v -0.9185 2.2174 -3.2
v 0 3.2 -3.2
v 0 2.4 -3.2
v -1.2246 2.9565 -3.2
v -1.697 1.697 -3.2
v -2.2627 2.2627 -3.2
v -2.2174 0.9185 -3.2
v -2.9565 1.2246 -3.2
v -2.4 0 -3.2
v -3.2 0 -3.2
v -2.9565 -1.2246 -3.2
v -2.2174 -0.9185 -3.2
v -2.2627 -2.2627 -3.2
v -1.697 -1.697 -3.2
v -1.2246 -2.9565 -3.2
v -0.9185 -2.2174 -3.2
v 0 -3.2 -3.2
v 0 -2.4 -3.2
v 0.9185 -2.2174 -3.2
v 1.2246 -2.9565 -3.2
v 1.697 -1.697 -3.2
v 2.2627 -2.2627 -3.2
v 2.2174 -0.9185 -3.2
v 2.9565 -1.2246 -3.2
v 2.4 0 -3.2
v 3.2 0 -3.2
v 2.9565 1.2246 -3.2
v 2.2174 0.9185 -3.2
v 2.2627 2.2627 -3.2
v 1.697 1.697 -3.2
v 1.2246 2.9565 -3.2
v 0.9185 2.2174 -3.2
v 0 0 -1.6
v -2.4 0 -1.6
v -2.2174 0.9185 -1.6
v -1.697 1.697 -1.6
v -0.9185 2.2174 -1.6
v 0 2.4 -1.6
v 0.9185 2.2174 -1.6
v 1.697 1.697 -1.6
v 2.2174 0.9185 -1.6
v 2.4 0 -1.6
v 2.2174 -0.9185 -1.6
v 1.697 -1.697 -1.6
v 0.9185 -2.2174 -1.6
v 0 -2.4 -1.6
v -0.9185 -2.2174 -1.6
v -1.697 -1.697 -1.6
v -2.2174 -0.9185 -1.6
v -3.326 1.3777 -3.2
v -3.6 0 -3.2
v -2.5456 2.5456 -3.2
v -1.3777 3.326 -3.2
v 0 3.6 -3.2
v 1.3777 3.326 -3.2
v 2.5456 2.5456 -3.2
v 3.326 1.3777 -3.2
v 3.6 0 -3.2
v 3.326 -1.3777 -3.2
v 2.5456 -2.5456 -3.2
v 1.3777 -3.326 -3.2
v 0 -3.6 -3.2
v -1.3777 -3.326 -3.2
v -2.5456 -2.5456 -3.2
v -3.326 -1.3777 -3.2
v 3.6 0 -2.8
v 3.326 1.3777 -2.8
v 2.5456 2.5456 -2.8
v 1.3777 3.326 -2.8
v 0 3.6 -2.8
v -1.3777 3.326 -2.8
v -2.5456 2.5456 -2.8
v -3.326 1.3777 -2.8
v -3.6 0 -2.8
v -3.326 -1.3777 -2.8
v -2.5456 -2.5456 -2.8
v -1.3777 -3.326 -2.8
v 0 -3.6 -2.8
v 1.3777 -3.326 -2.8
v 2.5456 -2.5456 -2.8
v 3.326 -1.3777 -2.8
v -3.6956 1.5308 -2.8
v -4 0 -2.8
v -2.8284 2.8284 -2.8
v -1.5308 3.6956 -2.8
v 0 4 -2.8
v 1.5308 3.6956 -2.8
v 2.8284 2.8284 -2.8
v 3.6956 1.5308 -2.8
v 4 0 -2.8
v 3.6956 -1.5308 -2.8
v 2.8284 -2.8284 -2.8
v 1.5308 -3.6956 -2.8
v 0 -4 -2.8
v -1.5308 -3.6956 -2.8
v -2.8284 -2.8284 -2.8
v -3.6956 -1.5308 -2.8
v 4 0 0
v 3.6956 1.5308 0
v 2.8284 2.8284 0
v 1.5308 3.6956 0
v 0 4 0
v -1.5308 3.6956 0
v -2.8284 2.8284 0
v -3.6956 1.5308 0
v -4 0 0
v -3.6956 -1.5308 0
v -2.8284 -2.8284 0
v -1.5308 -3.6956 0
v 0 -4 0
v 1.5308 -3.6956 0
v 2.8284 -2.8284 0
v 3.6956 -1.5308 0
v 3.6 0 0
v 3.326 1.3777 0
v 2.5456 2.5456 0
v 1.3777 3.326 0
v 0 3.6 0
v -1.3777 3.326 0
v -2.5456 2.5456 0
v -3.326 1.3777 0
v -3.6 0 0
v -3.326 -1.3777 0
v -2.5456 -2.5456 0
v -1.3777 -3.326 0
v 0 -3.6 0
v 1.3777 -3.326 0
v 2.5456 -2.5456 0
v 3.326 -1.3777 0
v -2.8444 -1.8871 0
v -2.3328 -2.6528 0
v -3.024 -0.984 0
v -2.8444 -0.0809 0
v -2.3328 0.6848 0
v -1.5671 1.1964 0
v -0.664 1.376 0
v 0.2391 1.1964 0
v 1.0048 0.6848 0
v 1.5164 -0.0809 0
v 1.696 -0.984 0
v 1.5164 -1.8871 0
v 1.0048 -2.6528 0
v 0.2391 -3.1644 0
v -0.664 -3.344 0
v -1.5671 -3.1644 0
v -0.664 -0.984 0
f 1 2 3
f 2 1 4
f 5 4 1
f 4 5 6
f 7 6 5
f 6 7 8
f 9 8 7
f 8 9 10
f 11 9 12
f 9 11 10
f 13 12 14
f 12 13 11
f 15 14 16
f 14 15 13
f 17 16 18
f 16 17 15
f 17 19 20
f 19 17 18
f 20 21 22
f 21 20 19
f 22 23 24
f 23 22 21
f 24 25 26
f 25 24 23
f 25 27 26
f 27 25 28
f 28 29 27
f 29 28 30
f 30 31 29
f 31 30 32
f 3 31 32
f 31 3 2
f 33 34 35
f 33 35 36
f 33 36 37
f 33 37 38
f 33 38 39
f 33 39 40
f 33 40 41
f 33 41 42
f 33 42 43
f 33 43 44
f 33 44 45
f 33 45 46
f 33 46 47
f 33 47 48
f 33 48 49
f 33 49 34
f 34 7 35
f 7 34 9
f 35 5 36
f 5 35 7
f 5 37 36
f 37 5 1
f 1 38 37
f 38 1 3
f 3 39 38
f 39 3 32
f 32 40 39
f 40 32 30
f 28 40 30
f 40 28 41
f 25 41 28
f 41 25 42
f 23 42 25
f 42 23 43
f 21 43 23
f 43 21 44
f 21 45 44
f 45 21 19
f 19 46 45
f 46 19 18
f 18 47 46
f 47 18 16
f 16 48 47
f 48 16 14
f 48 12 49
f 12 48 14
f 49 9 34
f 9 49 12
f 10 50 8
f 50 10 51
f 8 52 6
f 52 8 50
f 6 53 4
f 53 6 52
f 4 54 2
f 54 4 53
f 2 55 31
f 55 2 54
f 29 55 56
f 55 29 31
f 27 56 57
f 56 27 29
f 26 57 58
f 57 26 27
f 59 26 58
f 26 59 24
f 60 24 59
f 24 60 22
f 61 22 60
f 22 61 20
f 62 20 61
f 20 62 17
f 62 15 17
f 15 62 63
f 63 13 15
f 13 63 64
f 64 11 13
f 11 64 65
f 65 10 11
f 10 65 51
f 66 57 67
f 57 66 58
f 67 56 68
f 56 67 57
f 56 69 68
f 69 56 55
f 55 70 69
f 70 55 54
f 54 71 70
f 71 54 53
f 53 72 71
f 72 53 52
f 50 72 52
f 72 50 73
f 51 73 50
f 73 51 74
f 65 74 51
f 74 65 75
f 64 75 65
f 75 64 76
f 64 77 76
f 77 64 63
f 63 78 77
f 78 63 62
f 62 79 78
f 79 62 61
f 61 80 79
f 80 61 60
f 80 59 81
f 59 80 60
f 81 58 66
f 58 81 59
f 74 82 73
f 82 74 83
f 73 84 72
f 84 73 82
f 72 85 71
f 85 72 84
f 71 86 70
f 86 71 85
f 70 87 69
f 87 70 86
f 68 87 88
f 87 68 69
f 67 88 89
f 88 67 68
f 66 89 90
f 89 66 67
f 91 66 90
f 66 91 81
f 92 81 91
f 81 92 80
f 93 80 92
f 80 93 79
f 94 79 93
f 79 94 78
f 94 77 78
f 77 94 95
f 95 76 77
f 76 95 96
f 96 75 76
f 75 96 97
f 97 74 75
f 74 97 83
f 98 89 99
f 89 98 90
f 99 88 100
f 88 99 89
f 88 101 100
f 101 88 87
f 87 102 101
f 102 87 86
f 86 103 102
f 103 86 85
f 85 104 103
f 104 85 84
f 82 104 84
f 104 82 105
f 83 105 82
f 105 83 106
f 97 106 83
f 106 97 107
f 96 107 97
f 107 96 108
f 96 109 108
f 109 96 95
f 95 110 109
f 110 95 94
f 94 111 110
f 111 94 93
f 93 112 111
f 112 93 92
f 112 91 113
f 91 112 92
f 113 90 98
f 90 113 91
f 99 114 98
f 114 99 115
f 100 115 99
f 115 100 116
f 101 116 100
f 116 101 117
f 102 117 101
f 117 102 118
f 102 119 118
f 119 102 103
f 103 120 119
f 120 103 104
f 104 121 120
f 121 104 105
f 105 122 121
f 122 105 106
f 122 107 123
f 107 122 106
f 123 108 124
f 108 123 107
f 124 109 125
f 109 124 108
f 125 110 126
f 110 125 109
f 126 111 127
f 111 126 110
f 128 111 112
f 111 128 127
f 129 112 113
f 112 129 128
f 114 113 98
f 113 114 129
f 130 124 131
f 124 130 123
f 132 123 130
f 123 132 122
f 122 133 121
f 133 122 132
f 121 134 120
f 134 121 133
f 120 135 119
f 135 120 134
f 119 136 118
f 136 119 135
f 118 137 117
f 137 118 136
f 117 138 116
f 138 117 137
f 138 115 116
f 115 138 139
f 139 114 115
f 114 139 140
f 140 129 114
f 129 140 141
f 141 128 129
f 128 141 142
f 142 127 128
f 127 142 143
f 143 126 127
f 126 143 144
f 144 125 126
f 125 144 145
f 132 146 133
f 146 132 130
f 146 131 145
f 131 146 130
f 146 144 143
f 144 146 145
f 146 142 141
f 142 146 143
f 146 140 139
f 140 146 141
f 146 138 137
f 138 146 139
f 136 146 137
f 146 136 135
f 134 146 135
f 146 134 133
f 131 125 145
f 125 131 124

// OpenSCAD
// file: ../p/4-4disc.scad
use <../lib.scad>
function ldraw_lib__4_4disc() = [
// 0 Disc 1.0
// 0 Name: 4-4disc.dat
// 0 Author: James Jessiman
// 0 !LDRAW_ORG Primitive UPDATE 2002-02
// 0 !LICENSE Licensed under CC BY 4.0 : see CAreadme.txt
// 
// 0 BFC CERTIFY CCW
  [0,"BFC","CERTIFY"],
  [0,"BFC","CCW"],
// 
// 0 !HISTORY 1998-12-15 [PTadmin] Official Update 1998-10
// 0 !HISTORY 2002-03-23 [sbliss] Added BFC statement
// 0 !HISTORY 2002-04-25 [PTadmin] Official Update 2002-02
// 0 !HISTORY 2007-06-24 [PTadmin] Header formatted for Contributor Agreement
// 0 !HISTORY 2008-07-01 [PTadmin] Official Update 2008-01
// 
// 
// 3 16 0 0 0 1 0 0 0.9239 0 0.3827
  [3,16,0,0,0,1,0,0,0.9239,0,0.3827],
// 3 16 0 0 0 0.9239 0 0.3827 0.7071 0 0.7071
  [3,16,0,0,0,0.9239,0,0.3827,0.7071,0,0.7071],
// 3 16 0 0 0 0.7071 0 0.7071 0.3827 0 0.9239
  [3,16,0,0,0,0.7071,0,0.7071,0.3827,0,0.9239],
// 3 16 0 0 0 0.3827 0 0.9239 0 0 1
  [3,16,0,0,0,0.3827,0,0.9239,0,0,1],
// 3 16 0 0 0 0 0 1 -0.3827 0 0.9239
  [3,16,0,0,0,0,0,1,-0.3827,0,0.9239],
// 3 16 0 0 0 -0.3827 0 0.9239 -0.7071 0 0.7071
  [3,16,0,0,0,-0.3827,0,0.9239,-0.7071,0,0.7071],
// 3 16 0 0 0 -0.7071 0 0.7071 -0.9239 0 0.3827
  [3,16,0,0,0,-0.7071,0,0.7071,-0.9239,0,0.3827],
// 3 16 0 0 0 -0.9239 0 0.3827 -1 0 -0
  [3,16,0,0,0,-0.9239,0,0.3827,-1,0,-0],
// 3 16 0 0 0 -1 0 -0 -0.9239 0 -0.3827
  [3,16,0,0,0,-1,0,-0,-0.9239,0,-0.3827],
// 3 16 0 0 0 -0.9239 0 -0.3827 -0.7071 0 -0.7071
  [3,16,0,0,0,-0.9239,0,-0.3827,-0.7071,0,-0.7071],
// 3 16 0 0 0 -0.7071 0 -0.7071 -0.3827 0 -0.9239
  [3,16,0,0,0,-0.7071,0,-0.7071,-0.3827,0,-0.9239],
// 3 16 0 0 0 -0.3827 0 -0.9239 0 0 -1
  [3,16,0,0,0,-0.3827,0,-0.9239,0,0,-1],
// 3 16 0 0 0 0 0 -1 0.3827 0 -0.9239
  [3,16,0,0,0,0,0,-1,0.3827,0,-0.9239],
// 3 16 0 0 0 0.3827 0 -0.9239 0.7071 0 -0.7071
  [3,16,0,0,0,0.3827,0,-0.9239,0.7071,0,-0.7071],
// 3 16 0 0 0 0.7071 0 -0.7071 0.9239 0 -0.3827
  [3,16,0,0,0,0.7071,0,-0.7071,0.9239,0,-0.3827],
// 3 16 0 0 0 0.9239 0 -0.3827 1 0 0
  [3,16,0,0,0,0.9239,0,-0.3827,1,0,0],
// 0
];
module ldraw_lib__4_4disc(step=0, col=false, unit=2/5, alt=false, line=0.2, solid=!$preview)
    makepoly(ldraw_lib__4_4disc(), step=step, col=col, unit=unit, alt=alt, line=line, solid=solid);
ldraw_lib__4_4disc(line=0.2);
// file: ../p/4-4ring3.scad
use <../lib.scad>
function ldraw_lib__4_4ring3() = [
// 0 Ring  3 x 1.0
// 0 Name: 4-4ring3.dat
// 0 Author: James Jessiman
// 0 !LDRAW_ORG Primitive UPDATE 2009-01
// 0 !LICENSE Licensed under CC BY 2.0 and CC BY 4.0 : see CAreadme.txt
// 
// 0 BFC CERTIFY CCW
  [0,"BFC","CERTIFY"],
  [0,"BFC","CCW"],
// 
// 0 !HISTORY 1998-12-15 [PTadmin] Official Update 1998-10
// 0 !HISTORY 2002-04-05 [hafhead] Added BFC statement
// 0 !HISTORY 2002-04-25 [PTadmin] Official Update 2002-02
// 0 !HISTORY 2007-06-24 [PTadmin] Header formatted for Contributor Agreement
// 0 !HISTORY 2008-07-01 [PTadmin] Official Update 2008-01
// 0 !HISTORY 2008-08-26 [cwdee] Switch polygon winding and rename
// 0 !HISTORY 2009-05-02 [PTadmin] Official Update 2009-01
// 
// 
// 4 16 -1.5308 0 3.6956 -1.1481 0 2.7717 0 0 3 0 0 4
  [4,16,-1.5308,0,3.6956,-1.1481,0,2.7717,0,0,3,0,0,4],
// 4 16 -2.8284 0 2.8284 -2.1213 0 2.1213 -1.1481 0 2.7717 -1.5308 0 3.6956
  [4,16,-2.8284,0,2.8284,-2.1213,0,2.1213,-1.1481,0,2.7717,-1.5308,0,3.6956],
// 4 16 -3.6956 0 1.5308 -2.7717 0 1.1481 -2.1213 0 2.1213 -2.8284 0 2.8284
  [4,16,-3.6956,0,1.5308,-2.7717,0,1.1481,-2.1213,0,2.1213,-2.8284,0,2.8284],
// 4 16 -4 0 0 -3 0 0 -2.7717 0 1.1481 -3.6956 0 1.5308
  [4,16,-4,0,0,-3,0,0,-2.7717,0,1.1481,-3.6956,0,1.5308],
// 4 16 -3.6956 0 -1.5308 -2.7717 0 -1.1481 -3 0 0 -4 0 0
  [4,16,-3.6956,0,-1.5308,-2.7717,0,-1.1481,-3,0,0,-4,0,0],
// 4 16 -2.8284 0 -2.8284 -2.1213 0 -2.1213 -2.7717 0 -1.1481 -3.6956 0 -1.5308
  [4,16,-2.8284,0,-2.8284,-2.1213,0,-2.1213,-2.7717,0,-1.1481,-3.6956,0,-1.5308],
// 4 16 -1.5308 0 -3.6956 -1.1481 0 -2.7717 -2.1213 0 -2.1213 -2.8284 0 -2.8284
  [4,16,-1.5308,0,-3.6956,-1.1481,0,-2.7717,-2.1213,0,-2.1213,-2.8284,0,-2.8284],
// 4 16 0 0 -4 0 0 -3 -1.1481 0 -2.7717 -1.5308 0 -3.6956
  [4,16,0,0,-4,0,0,-3,-1.1481,0,-2.7717,-1.5308,0,-3.6956],
// 4 16 1.5308 0 -3.6956 1.1481 0 -2.7717 0 0 -3 0 0 -4
  [4,16,1.5308,0,-3.6956,1.1481,0,-2.7717,0,0,-3,0,0,-4],
// 4 16 2.8284 0 -2.8284 2.1213 0 -2.1213 1.1481 0 -2.7717 1.5308 0 -3.6956
  [4,16,2.8284,0,-2.8284,2.1213,0,-2.1213,1.1481,0,-2.7717,1.5308,0,-3.6956],
// 4 16 3.6956 0 -1.5308 2.7717 0 -1.1481 2.1213 0 -2.1213 2.8284 0 -2.8284
  [4,16,3.6956,0,-1.5308,2.7717,0,-1.1481,2.1213,0,-2.1213,2.8284,0,-2.8284],
// 4 16 4 0 0 3 0 0 2.7717 0 -1.1481 3.6956 0 -1.5308
  [4,16,4,0,0,3,0,0,2.7717,0,-1.1481,3.6956,0,-1.5308],
// 4 16 3.6956 0 1.5308 2.7717 0 1.1481 3 0 0 4 0 0
  [4,16,3.6956,0,1.5308,2.7717,0,1.1481,3,0,0,4,0,0],
// 4 16 2.8284 0 2.8284 2.1213 0 2.1213 2.7717 0 1.1481 3.6956 0 1.5308
  [4,16,2.8284,0,2.8284,2.1213,0,2.1213,2.7717,0,1.1481,3.6956,0,1.5308],
// 4 16 1.5308 0 3.6956 1.1481 0 2.7717 2.1213 0 2.1213 2.8284 0 2.8284
  [4,16,1.5308,0,3.6956,1.1481,0,2.7717,2.1213,0,2.1213,2.8284,0,2.8284],
// 4 16 0 0 4 0 0 3 1.1481 0 2.7717 1.5308 0 3.6956
  [4,16,0,0,4,0,0,3,1.1481,0,2.7717,1.5308,0,3.6956],
// 0
];
module ldraw_lib__4_4ring3(step=0, col=false, unit=2/5, alt=false, line=0.2, solid=!$preview)
    makepoly(ldraw_lib__4_4ring3(), step=step, col=col, unit=unit, alt=alt, line=line, solid=solid);
ldraw_lib__4_4ring3(line=0.2);
// file: ../p/4-4cylc.scad
use <../lib.scad>
use <4-4cyli.scad>
use <4-4disc.scad>
use <4-4edge.scad>
function ldraw_lib__4_4cylc() = [
// 0 Cylinder Closed 1.0
// 0 Name: 4-4cylc.dat
// 0 Author: Alex Taylor [anathema]
// 0 !LDRAW_ORG Primitive UPDATE 2009-02
// 0 !LICENSE Licensed under CC BY 2.0 and CC BY 4.0 : see CAreadme.txt
// 
// 0 BFC CERTIFY CCW
  [0,"BFC","CERTIFY"],
  [0,"BFC","CCW"],
// 
// 0 !HISTORY 2008-12-29 [cwdee] Removed one disc
// 0 !HISTORY 2009-09-03 [PTadmin] Official Update 2009-02
// 
// 
// 1 16 0 0 0 1 0 0 0 1 0 0 0 1 4-4edge.dat
  [1,16,0,0,0,1,0,0,0,1,0,0,0,1, ldraw_lib__4_4edge()],
// 1 16 0 1 0 1 0 0 0 1 0 0 0 1 4-4edge.dat
  [1,16,0,1,0,1,0,0,0,1,0,0,0,1, ldraw_lib__4_4edge()],
// 1 16 0 0 0 1 0 0 0 1 0 0 0 1 4-4disc.dat
  [1,16,0,0,0,1,0,0,0,1,0,0,0,1, ldraw_lib__4_4disc()],
// 1 16 0 0 0 1 0 0 0 1 0 0 0 1 4-4cyli.dat
  [1,16,0,0,0,1,0,0,0,1,0,0,0,1, ldraw_lib__4_4cyli()],
// 0
];
module ldraw_lib__4_4cylc(step=0, col=false, unit=2/5, alt=false, line=0.2, solid=!$preview)
    makepoly(ldraw_lib__4_4cylc(), step=step, col=col, unit=unit, alt=alt, line=line, solid=solid);
ldraw_lib__4_4cylc(line=0.2);
// file: ../p/4-4edge.scad
use <../lib.scad>
function ldraw_lib__4_4edge() = [
// 0 Circle 1.0
// 0 Name: 4-4edge.dat
// 0 Author: James Jessiman
// 0 !LDRAW_ORG Primitive UPDATE 2017-01
// 0 !LICENSE Licensed under CC BY 4.0 : see CAreadme.txt
// 
// 0 BFC CERTIFY CCW
  [0,"BFC","CERTIFY"],
  [0,"BFC","CCW"],
// 
// 0 !HISTORY 1998-12-15 [PTadmin] Official Update 1998-10
// 0 !HISTORY 2005-12-28 [PTadmin] Official Update 2005-01
// 0 !HISTORY 2007-06-24 [PTadmin] Header formatted for Contributor Agreement
// 0 !HISTORY 2008-07-01 [PTadmin] Official Update 2008-01
// 0 !HISTORY 2017-01-15 [Steffen] BFCed
// 0 !HISTORY 2017-12-30 [PTadmin] Official Update 2017-01
// 
// 
// 2 24 1 0 0 0.9239 0 0.3827
  [2,24,1,0,0,0.9239,0,0.3827],
// 2 24 0.9239 0 0.3827 0.7071 0 0.7071
  [2,24,0.9239,0,0.3827,0.7071,0,0.7071],
// 2 24 0.7071 0 0.7071 0.3827 0 0.9239
  [2,24,0.7071,0,0.7071,0.3827,0,0.9239],
// 2 24 0.3827 0 0.9239 0 0 1
  [2,24,0.3827,0,0.9239,0,0,1],
// 2 24 0 0 1 -0.3827 0 0.9239
  [2,24,0,0,1,-0.3827,0,0.9239],
// 2 24 -0.3827 0 0.9239 -0.7071 0 0.7071
  [2,24,-0.3827,0,0.9239,-0.7071,0,0.7071],
// 2 24 -0.7071 0 0.7071 -0.9239 0 0.3827
  [2,24,-0.7071,0,0.7071,-0.9239,0,0.3827],
// 2 24 -0.9239 0 0.3827 -1 0 -0
  [2,24,-0.9239,0,0.3827,-1,0,-0],
// 2 24 -1 0 -0 -0.9239 0 -0.3827
  [2,24,-1,0,-0,-0.9239,0,-0.3827],
// 2 24 -0.9239 0 -0.3827 -0.7071 0 -0.7071
  [2,24,-0.9239,0,-0.3827,-0.7071,0,-0.7071],
// 2 24 -0.7071 0 -0.7071 -0.3827 0 -0.9239
  [2,24,-0.7071,0,-0.7071,-0.3827,0,-0.9239],
// 2 24 -0.3827 0 -0.9239 0 0 -1
  [2,24,-0.3827,0,-0.9239,0,0,-1],
// 2 24 0 0 -1 0.3827 0 -0.9239
  [2,24,0,0,-1,0.3827,0,-0.9239],
// 2 24 0.3827 0 -0.9239 0.7071 0 -0.7071
  [2,24,0.3827,0,-0.9239,0.7071,0,-0.7071],
// 2 24 0.7071 0 -0.7071 0.9239 0 -0.3827
  [2,24,0.7071,0,-0.7071,0.9239,0,-0.3827],
// 2 24 0.9239 0 -0.3827 1 0 0
  [2,24,0.9239,0,-0.3827,1,0,0],
];
module ldraw_lib__4_4edge(step=0, col=false, unit=2/5, alt=false, line=0.2, solid=!$preview)
    makepoly(ldraw_lib__4_4edge(), step=step, col=col, unit=unit, alt=alt, line=line, solid=solid);
ldraw_lib__4_4edge(line=0.2);
// file: ../p/4-4cyli.scad
use <../lib.scad>
function ldraw_lib__4_4cyli() = [
// 0 Cylinder 1.0
// 0 Name: 4-4cyli.dat
// 0 Author: James Jessiman
// 0 !LDRAW_ORG Primitive UPDATE 2005-01
// 0 !LICENSE Licensed under CC BY 2.0 and CC BY 4.0 : see CAreadme.txt
// 
// 0 BFC CERTIFY CCW
  [0,"BFC","CERTIFY"],
  [0,"BFC","CCW"],
// 
// 0 !HISTORY 1998-12-15 [PTadmin] Official Update 1998-10
// 0 !HISTORY 2002-03-23 [sbliss] Added BFC statement; merged headers from files in distributions LDraw 0.27 and Complete.
// 0 !HISTORY 2002-04-25 [PTadmin] Official Update 2002-02
// 0 !HISTORY 2004-12-14 [guyvivan] BFC CCW
// 0 !HISTORY 2005-12-28 [PTadmin] Official Update 2005-01
// 0 !HISTORY 2007-06-24 [PTadmin] Header formatted for Contributor Agreement
// 0 !HISTORY 2008-07-01 [PTadmin] Official Update 2008-01
// 
// 
// 4 16 1 1 0 0.9239 1 0.3827 0.9239 0 0.3827 1 0 0
  [4,16,1,1,0,0.9239,1,0.3827,0.9239,0,0.3827,1,0,0],
// 5 24 1 0 0 1 1 0 0.9239 0 0.3827 0.9239 0 -0.3827
  [5,24,1,0,0,1,1,0,0.9239,0,0.3827,0.9239,0,-0.3827],
// 4 16 0.9239 1 0.3827 0.7071 1 0.7071 0.7071 0 0.7071 0.9239 0 0.3827
  [4,16,0.9239,1,0.3827,0.7071,1,0.7071,0.7071,0,0.7071,0.9239,0,0.3827],
// 5 24 0.9239 0 0.3827 0.9239 1 0.3827 0.7071 0 0.7071 1 0 0
  [5,24,0.9239,0,0.3827,0.9239,1,0.3827,0.7071,0,0.7071,1,0,0],
// 4 16 0.7071 1 0.7071 0.3827 1 0.9239 0.3827 0 0.9239 0.7071 0 0.7071
  [4,16,0.7071,1,0.7071,0.3827,1,0.9239,0.3827,0,0.9239,0.7071,0,0.7071],
// 5 24 0.7071 0 0.7071 0.7071 1 0.7071 0.3827 0 0.9239 0.9239 0 0.3827
  [5,24,0.7071,0,0.7071,0.7071,1,0.7071,0.3827,0,0.9239,0.9239,0,0.3827],
// 4 16 0.3827 1 0.9239 0 1 1 0 0 1 0.3827 0 0.9239
  [4,16,0.3827,1,0.9239,0,1,1,0,0,1,0.3827,0,0.9239],
// 5 24 0.3827 0 0.9239 0.3827 1 0.9239 0 0 1 0.7071 0 0.7071
  [5,24,0.3827,0,0.9239,0.3827,1,0.9239,0,0,1,0.7071,0,0.7071],
// 4 16 0 1 1 -0.3827 1 0.9239 -0.3827 0 0.9239 0 0 1
  [4,16,0,1,1,-0.3827,1,0.9239,-0.3827,0,0.9239,0,0,1],
// 5 24 0 0 1 0 1 1 -0.3827 0 0.9239 0.3827 0 0.9239
  [5,24,0,0,1,0,1,1,-0.3827,0,0.9239,0.3827,0,0.9239],
// 4 16 -0.3827 1 0.9239 -0.7071 1 0.7071 -0.7071 0 0.7071 -0.3827 0 0.9239
  [4,16,-0.3827,1,0.9239,-0.7071,1,0.7071,-0.7071,0,0.7071,-0.3827,0,0.9239],
// 5 24 -0.3827 0 0.9239 -0.3827 1 0.9239 -0.7071 0 0.7071 0 0 1
  [5,24,-0.3827,0,0.9239,-0.3827,1,0.9239,-0.7071,0,0.7071,0,0,1],
// 4 16 -0.7071 1 0.7071 -0.9239 1 0.3827 -0.9239 0 0.3827 -0.7071 0 0.7071
  [4,16,-0.7071,1,0.7071,-0.9239,1,0.3827,-0.9239,0,0.3827,-0.7071,0,0.7071],
// 5 24 -0.7071 0 0.7071 -0.7071 1 0.7071 -0.9239 0 0.3827 -0.3827 0 0.9239
  [5,24,-0.7071,0,0.7071,-0.7071,1,0.7071,-0.9239,0,0.3827,-0.3827,0,0.9239],
// 4 16 -0.9239 1 0.3827 -1 1 0 -1 0 0 -0.9239 0 0.3827
  [4,16,-0.9239,1,0.3827,-1,1,0,-1,0,0,-0.9239,0,0.3827],
// 5 24 -0.9239 0 0.3827 -0.9239 1 0.3827 -1 0 0 -0.7071 0 0.7071
  [5,24,-0.9239,0,0.3827,-0.9239,1,0.3827,-1,0,0,-0.7071,0,0.7071],
// 4 16 -1 1 0 -0.9239 1 -0.3827 -0.9239 0 -0.3827 -1 0 0
  [4,16,-1,1,0,-0.9239,1,-0.3827,-0.9239,0,-0.3827,-1,0,0],
// 5 24 -1 0 0 -1 1 0 -0.9239 0 -0.3827 -0.9239 0 0.3827
  [5,24,-1,0,0,-1,1,0,-0.9239,0,-0.3827,-0.9239,0,0.3827],
// 4 16 -0.9239 1 -0.3827 -0.7071 1 -0.7071 -0.7071 0 -0.7071 -0.9239 0 -0.3827
  [4,16,-0.9239,1,-0.3827,-0.7071,1,-0.7071,-0.7071,0,-0.7071,-0.9239,0,-0.3827],
// 5 24 -0.9239 0 -0.3827 -0.9239 1 -0.3827 -0.7071 0 -0.7071 -1 0 0
  [5,24,-0.9239,0,-0.3827,-0.9239,1,-0.3827,-0.7071,0,-0.7071,-1,0,0],
// 4 16 -0.7071 1 -0.7071 -0.3827 1 -0.9239 -0.3827 0 -0.9239 -0.7071 0 -0.7071
  [4,16,-0.7071,1,-0.7071,-0.3827,1,-0.9239,-0.3827,0,-0.9239,-0.7071,0,-0.7071],
// 5 24 -0.7071 0 -0.7071 -0.7071 1 -0.7071 -0.3827 0 -0.9239 -0.9239 0 -0.3827
  [5,24,-0.7071,0,-0.7071,-0.7071,1,-0.7071,-0.3827,0,-0.9239,-0.9239,0,-0.3827],
// 4 16 -0.3827 1 -0.9239 0 1 -1 0 0 -1 -0.3827 0 -0.9239
  [4,16,-0.3827,1,-0.9239,0,1,-1,0,0,-1,-0.3827,0,-0.9239],
// 5 24 -0.3827 0 -0.9239 -0.3827 1 -0.9239 0 0 -1 -0.7071 0 -0.7071
  [5,24,-0.3827,0,-0.9239,-0.3827,1,-0.9239,0,0,-1,-0.7071,0,-0.7071],
// 4 16 0 1 -1 0.3827 1 -0.9239 0.3827 0 -0.9239 0 0 -1
  [4,16,0,1,-1,0.3827,1,-0.9239,0.3827,0,-0.9239,0,0,-1],
// 5 24 0 0 -1 0 1 -1 0.3827 0 -0.9239 -0.3827 0 -0.9239
  [5,24,0,0,-1,0,1,-1,0.3827,0,-0.9239,-0.3827,0,-0.9239],
// 4 16 0.3827 1 -0.9239 0.7071 1 -0.7071 0.7071 0 -0.7071 0.3827 0 -0.9239
  [4,16,0.3827,1,-0.9239,0.7071,1,-0.7071,0.7071,0,-0.7071,0.3827,0,-0.9239],
// 5 24 0.3827 0 -0.9239 0.3827 1 -0.9239 0.7071 0 -0.7071 0 0 -1
  [5,24,0.3827,0,-0.9239,0.3827,1,-0.9239,0.7071,0,-0.7071,0,0,-1],
// 4 16 0.7071 1 -0.7071 0.9239 1 -0.3827 0.9239 0 -0.3827 0.7071 0 -0.7071
  [4,16,0.7071,1,-0.7071,0.9239,1,-0.3827,0.9239,0,-0.3827,0.7071,0,-0.7071],
// 5 24 0.7071 0 -0.7071 0.7071 1 -0.7071 0.9239 0 -0.3827 0.3827 0 -0.9239
  [5,24,0.7071,0,-0.7071,0.7071,1,-0.7071,0.9239,0,-0.3827,0.3827,0,-0.9239],
// 4 16 0.9239 1 -0.3827 1 1 0 1 0 0 0.9239 0 -0.3827
  [4,16,0.9239,1,-0.3827,1,1,0,1,0,0,0.9239,0,-0.3827],
// 5 24 0.9239 0 -0.3827 0.9239 1 -0.3827 1 0 0 0.7071 0 -0.7071
  [5,24,0.9239,0,-0.3827,0.9239,1,-0.3827,1,0,0,0.7071,0,-0.7071],
// 0
];
module ldraw_lib__4_4cyli(step=0, col=false, unit=2/5, alt=false, line=0.2, solid=!$preview)
    makepoly(ldraw_lib__4_4cyli(), step=step, col=col, unit=unit, alt=alt, line=line, solid=solid);
ldraw_lib__4_4cyli(line=0.2);
// file: ../p/stud4o.scad
use <../lib.scad>
use <4-4cylc.scad>
use <4-4ring3.scad>
function ldraw_lib__stud4o() = [
// 0 Stud Tube Open without Outer Cylinder
// 0 Name: stud4o.dat
// 0 Author: Magnus Forsberg [MagFors]
// 0 !LDRAW_ORG Primitive UPDATE 2011-02
// 0 !LICENSE Licensed under CC BY 4.0 : see CAreadme.txt
// 
// 0 !HELP This stud is a "antistud" to be used like a underside stud,
// 0 !HELP but without the outer cylinder.
// 0 !HELP 1 47 0 0 0 1 0 0 0 1 0 0 0 1 stud4.dat
// 
// 0 BFC CERTIFY CCW
  [0,"BFC","CERTIFY"],
  [0,"BFC","CCW"],
// 
// 0 !HISTORY 2011-12-29 [PTadmin] Official Update 2011-02
// 
// 
// 1 16 0 -4 0 2 0 0 0 1 0 0 0 2 4-4ring3.dat
  [1,16,0,-4,0,2,0,0,0,1,0,0,0,2, ldraw_lib__4_4ring3()],
// 0 BFC INVERTNEXT
  [0,"BFC","INVERTNEXT"],
// 1 16 0 0 0 -6 0 0 0 -4 0 0 0 6 4-4cylc.dat
  [1,16,0,0,0,-6,0,0,0,-4,0,0,0,6, ldraw_lib__4_4cylc()],
];
module ldraw_lib__stud4o(step=0, col=false, unit=2/5, alt=false, line=0.2, solid=!$preview)
    makepoly(ldraw_lib__stud4o(), step=step, col=col, unit=unit, alt=alt, line=line, solid=solid);
ldraw_lib__stud4o(line=0.2);
// file: ../p/4-4ring8.scad
use <../lib.scad>
function ldraw_lib__4_4ring8() = [
// 0 Ring  8 x 1.0
// 0 Name: 4-4ring8.dat
// 0 Author: Steffen [Steffen]
// 0 !LDRAW_ORG Primitive UPDATE 2012-01
// 0 !LICENSE Licensed under CC BY 4.0 : see CAreadme.txt
// 
// 0 BFC CERTIFY CCW
  [0,"BFC","CERTIFY"],
  [0,"BFC","CCW"],
// 
// 0 !HISTORY 2003-12-19 [PTadmin] Official Update 2003-03
// 0 !HISTORY 2007-06-24 [PTadmin] Header formatted for Contributor Agreement
// 0 !HISTORY 2008-07-01 [PTadmin] Official Update 2008-01
// 0 !HISTORY 2012-02-16 [Philo] Changed to CCW
// 0 !HISTORY 2012-03-30 [PTadmin] Official Update 2012-01
// 
// 
// 4 16 9 0 0 8.3151 0 3.4443 7.3912 0 3.0616 8 0 0
  [4,16,9,0,0,8.3151,0,3.4443,7.3912,0,3.0616,8,0,0],
// 4 16 8.3151 0 3.4443 6.3639 0 6.3639 5.6568 0 5.6568 7.3912 0 3.0616
  [4,16,8.3151,0,3.4443,6.3639,0,6.3639,5.6568,0,5.6568,7.3912,0,3.0616],
// 4 16 6.3639 0 6.3639 3.4443 0 8.3151 3.0616 0 7.3912 5.6568 0 5.6568
  [4,16,6.3639,0,6.3639,3.4443,0,8.3151,3.0616,0,7.3912,5.6568,0,5.6568],
// 4 16 3.4443 0 8.3151 0 0 9 0 0 8 3.0616 0 7.3912
  [4,16,3.4443,0,8.3151,0,0,9,0,0,8,3.0616,0,7.3912],
// 4 16 0 0 9 -3.4443 0 8.3151 -3.0616 0 7.3912 0 0 8
  [4,16,0,0,9,-3.4443,0,8.3151,-3.0616,0,7.3912,0,0,8],
// 4 16 -3.4443 0 8.3151 -6.3639 0 6.3639 -5.6568 0 5.6568 -3.0616 0 7.3912
  [4,16,-3.4443,0,8.3151,-6.3639,0,6.3639,-5.6568,0,5.6568,-3.0616,0,7.3912],
// 4 16 -6.3639 0 6.3639 -8.3151 0 3.4443 -7.3912 0 3.0616 -5.6568 0 5.6568
  [4,16,-6.3639,0,6.3639,-8.3151,0,3.4443,-7.3912,0,3.0616,-5.6568,0,5.6568],
// 4 16 -8.3151 0 3.4443 -9 0 0 -8 0 0 -7.3912 0 3.0616
  [4,16,-8.3151,0,3.4443,-9,0,0,-8,0,0,-7.3912,0,3.0616],
// 4 16 -9 0 0 -8.3151 0 -3.4443 -7.3912 0 -3.0616 -8 0 0
  [4,16,-9,0,0,-8.3151,0,-3.4443,-7.3912,0,-3.0616,-8,0,0],
// 4 16 -8.3151 0 -3.4443 -6.3639 0 -6.3639 -5.6568 0 -5.6568 -7.3912 0 -3.0616
  [4,16,-8.3151,0,-3.4443,-6.3639,0,-6.3639,-5.6568,0,-5.6568,-7.3912,0,-3.0616],
// 4 16 -6.3639 0 -6.3639 -3.4443 0 -8.3151 -3.0616 0 -7.3912 -5.6568 0 -5.6568
  [4,16,-6.3639,0,-6.3639,-3.4443,0,-8.3151,-3.0616,0,-7.3912,-5.6568,0,-5.6568],
// 4 16 -3.4443 0 -8.3151 0 0 -9 0 0 -8 -3.0616 0 -7.3912
  [4,16,-3.4443,0,-8.3151,0,0,-9,0,0,-8,-3.0616,0,-7.3912],
// 4 16 0 0 -9 3.4443 0 -8.3151 3.0616 0 -7.3912 0 0 -8
  [4,16,0,0,-9,3.4443,0,-8.3151,3.0616,0,-7.3912,0,0,-8],
// 4 16 3.4443 0 -8.3151 6.3639 0 -6.3639 5.6568 0 -5.6568 3.0616 0 -7.3912
  [4,16,3.4443,0,-8.3151,6.3639,0,-6.3639,5.6568,0,-5.6568,3.0616,0,-7.3912],
// 4 16 6.3639 0 -6.3639 8.3151 0 -3.4443 7.3912 0 -3.0616 5.6568 0 -5.6568
  [4,16,6.3639,0,-6.3639,8.3151,0,-3.4443,7.3912,0,-3.0616,5.6568,0,-5.6568],
// 4 16 8.3151 0 -3.4443 9 0 0 8 0 0 7.3912 0 -3.0616
  [4,16,8.3151,0,-3.4443,9,0,0,8,0,0,7.3912,0,-3.0616],
];
module ldraw_lib__4_4ring8(step=0, col=false, unit=2/5, alt=false, line=0.2, solid=!$preview)
    makepoly(ldraw_lib__4_4ring8(), step=step, col=col, unit=unit, alt=alt, line=line, solid=solid);
ldraw_lib__4_4ring8(line=0.2);
// file: ../p/4-4cylo.scad
use <../lib.scad>
use <4-4cyli.scad>
use <4-4edge.scad>
function ldraw_lib__4_4cylo() = [
// 0 Cylinder Open 1.0
// 0 Name: 4-4cylo.dat
// 0 Author: Mark Kennedy [mkennedy]
// 0 !LDRAW_ORG Primitive UPDATE 2010-01
// 0 !LICENSE Licensed under CC BY 4.0 : see CAreadme.txt
// 
// 0 BFC CERTIFY CCW
  [0,"BFC","CERTIFY"],
  [0,"BFC","CCW"],
// 
// 0 !HISTORY 2010-04-05 [PTadmin] Official Update 2010-01
// 
// 
// 1 16 0 0 0 1 0 0 0 1 0 0 0 1 4-4edge.dat
  [1,16,0,0,0,1,0,0,0,1,0,0,0,1, ldraw_lib__4_4edge()],
// 1 16 0 1 0 1 0 0 0 1 0 0 0 1 4-4edge.dat
  [1,16,0,1,0,1,0,0,0,1,0,0,0,1, ldraw_lib__4_4edge()],
// 1 16 0 0 0 1 0 0 0 1 0 0 0 1 4-4cyli.dat
  [1,16,0,0,0,1,0,0,0,1,0,0,0,1, ldraw_lib__4_4cyli()],
// 0
];
module ldraw_lib__4_4cylo(step=0, col=false, unit=2/5, alt=false, line=0.2, solid=!$preview)
    makepoly(ldraw_lib__4_4cylo(), step=step, col=col, unit=unit, alt=alt, line=line, solid=solid);
ldraw_lib__4_4cylo(line=0.2);
// file: ../p/empty.scad
use <../lib.scad>
function ldraw_lib__empty() = [
// 0 Empty
// 0 Name: empty.dat
// 0 Author: Steffen [Steffen]
// 0 !LDRAW_ORG Primitive UPDATE 2015-01
// 0 !LICENSE Licensed under CC BY 4.0 : see CAreadme.txt
// 
// 0 BFC CERTIFY CCW
  [0,"BFC","CERTIFY"],
  [0,"BFC","CCW"],
// 
// 0 !HISTORY 2015-10-11 [PTadmin] Official Update 2015-01
// 
// 
// 0 // Tool MLCad cannot handle really empty files. This file is used as a workaround.
// 0 // It exceptionally contains forbidden non-LDRAW standard syntax to satisfy MLCad until it is fixed OR a different editor has become the de-facto LDRAW standard.
// 0 // The line being used here is an "impossible" conditional line which never should be visible,
// 0 // additionally hidden by a syntax explicitly hiding it from displaying.
// 
// 0 MLCAD HIDE 5 24 0 0 0 0.0001 0 0 0.0001 -0.0001 0 0 0 0
];
module ldraw_lib__empty(step=0, col=false, unit=2/5, alt=false, line=0.2, solid=!$preview)
    makepoly(ldraw_lib__empty(), step=step, col=col, unit=unit, alt=alt, line=line, solid=solid);
ldraw_lib__empty(line=0.2);
// file: s/98138s02.scad
use <../../lib.scad>
use <../../p/4-4cylo.scad>
use <../../p/4-4ring8.scad>
use <../../p/4-4ring9.scad>
use <../../p/stud4o.scad>
function ldraw_lib__s__98138s02() = [
// 0 ~Tile  1 x  1 Round with Groove without Complete Top Face
// 0 Name: s\98138s02.dat
// 0 Author: Magnus Forsberg [MagFors]
// 0 !LDRAW_ORG Subpart UPDATE 2020-01
// 0 !LICENSE Licensed under CC BY 4.0 : see CAreadme.txt
// 
// 0 BFC CERTIFY CCW
  [0,"BFC","CERTIFY"],
  [0,"BFC","CCW"],
// 
// 0 !HISTORY 2020-06-28 [PTadmin] Official Update 2020-01
// 
// 
// 1 16 0 4 0 1 0 0 0 -1 0 0 0 1 stud4o.dat
  [1,16,0,4,0,1,0,0,0,-1,0,0,0,1, ldraw_lib__stud4o()],
// 1 16 0 8 0 -1 0 0 0 -1 0 0 0 1 4-4ring8.dat
  [1,16,0,8,0,-1,0,0,0,-1,0,0,0,1, ldraw_lib__4_4ring8()],
// 1 16 0 7 0 9 0 0 0 1 0 0 0 9 4-4cylo.dat
  [1,16,0,7,0,9,0,0,0,1,0,0,0,9, ldraw_lib__4_4cylo()],
// 1 16 0 7 0 -1 0 0 0 -1 0 0 0 1 4-4ring9.dat
  [1,16,0,7,0,-1,0,0,0,-1,0,0,0,1, ldraw_lib__4_4ring9()],
// 1 16 0 0 0 10 0 0 0 7 0 0 0 10 4-4cylo.dat
  [1,16,0,0,0,10,0,0,0,7,0,0,0,10, ldraw_lib__4_4cylo()],
];
module ldraw_lib__s__98138s02(step=0, col=false, unit=2/5, alt=false, line=0.2, solid=!$preview)
    makepoly(ldraw_lib__s__98138s02(), step=step, col=col, unit=unit, alt=alt, line=line, solid=solid);
ldraw_lib__s__98138s02(line=0.2);
// file: ../p/4-4ring9.scad
use <../lib.scad>
function ldraw_lib__4_4ring9() = [
// 0 Ring  9 x 1.0
// 0 Name: 4-4ring9.dat
// 0 Author: John Riley [jriley]
// 0 !LDRAW_ORG Primitive UPDATE 2004-02
// 0 !LICENSE Licensed under CC BY 2.0 and CC BY 4.0 : see CAreadme.txt
// 
// 0 BFC CERTIFY CCW
  [0,"BFC","CERTIFY"],
  [0,"BFC","CCW"],
// 
// 0 !HISTORY 2004-04-22 [PTadmin] Official Update 2004-02
// 0 !HISTORY 2007-06-24 [PTadmin] Header formatted for Contributor Agreement
// 0 !HISTORY 2008-07-01 [PTadmin] Official Update 2008-01
// 
// 
// 4 16 9 0 0 10 0 0 9.239 0 3.827 8.3151 0 3.4443
  [4,16,9,0,0,10,0,0,9.239,0,3.827,8.3151,0,3.4443],
// 4 16 8.3151 0 3.4443 9.239 0 3.827 7.071 0 7.071 6.3639 0 6.3639
  [4,16,8.3151,0,3.4443,9.239,0,3.827,7.071,0,7.071,6.3639,0,6.3639],
// 4 16 6.3639 0 6.3639 7.071 0 7.071 3.827 0 9.239 3.4443 0 8.3151
  [4,16,6.3639,0,6.3639,7.071,0,7.071,3.827,0,9.239,3.4443,0,8.3151],
// 4 16 3.4443 0 8.3151 3.827 0 9.239 0 0 10 0 0 9
  [4,16,3.4443,0,8.3151,3.827,0,9.239,0,0,10,0,0,9],
// 4 16 0 0 9 0 0 10 -3.827 0 9.239 -3.4443 0 8.3151
  [4,16,0,0,9,0,0,10,-3.827,0,9.239,-3.4443,0,8.3151],
// 4 16 -3.4443 0 8.3151 -3.827 0 9.239 -7.071 0 7.071 -6.3639 0 6.3639
  [4,16,-3.4443,0,8.3151,-3.827,0,9.239,-7.071,0,7.071,-6.3639,0,6.3639],
// 4 16 -6.3639 0 6.3639 -7.071 0 7.071 -9.239 0 3.827 -8.3151 0 3.4443
  [4,16,-6.3639,0,6.3639,-7.071,0,7.071,-9.239,0,3.827,-8.3151,0,3.4443],
// 4 16 -8.3151 0 3.4443 -9.239 0 3.827 -10 0 0 -9 0 0
  [4,16,-8.3151,0,3.4443,-9.239,0,3.827,-10,0,0,-9,0,0],
// 4 16 -9 0 0 -10 0 0 -9.239 0 -3.827 -8.3151 0 -3.4443
  [4,16,-9,0,0,-10,0,0,-9.239,0,-3.827,-8.3151,0,-3.4443],
// 4 16 -8.3151 0 -3.4443 -9.239 0 -3.827 -7.071 0 -7.071 -6.3639 0 -6.3639
  [4,16,-8.3151,0,-3.4443,-9.239,0,-3.827,-7.071,0,-7.071,-6.3639,0,-6.3639],
// 4 16 -6.3639 0 -6.3639 -7.071 0 -7.071 -3.827 0 -9.239 -3.4443 0 -8.3151
  [4,16,-6.3639,0,-6.3639,-7.071,0,-7.071,-3.827,0,-9.239,-3.4443,0,-8.3151],
// 4 16 -3.4443 0 -8.3151 -3.827 0 -9.239 0 0 -10 0 0 -9
  [4,16,-3.4443,0,-8.3151,-3.827,0,-9.239,0,0,-10,0,0,-9],
// 4 16 0 0 -9 0 0 -10 3.827 0 -9.239 3.4443 0 -8.3151
  [4,16,0,0,-9,0,0,-10,3.827,0,-9.239,3.4443,0,-8.3151],
// 4 16 3.4443 0 -8.3151 3.827 0 -9.239 7.071 0 -7.071 6.3639 0 -6.3639
  [4,16,3.4443,0,-8.3151,3.827,0,-9.239,7.071,0,-7.071,6.3639,0,-6.3639],
// 4 16 6.3639 0 -6.3639 7.071 0 -7.071 9.239 0 -3.827 8.3151 0 -3.4443
  [4,16,6.3639,0,-6.3639,7.071,0,-7.071,9.239,0,-3.827,8.3151,0,-3.4443],
// 4 16 8.3151 0 -3.4443 9.239 0 -3.827 10 0 0 9 0 0
  [4,16,8.3151,0,-3.4443,9.239,0,-3.827,10,0,0,9,0,0],
// 0
];
module ldraw_lib__4_4ring9(step=0, col=false, unit=2/5, alt=false, line=0.2, solid=!$preview)
    makepoly(ldraw_lib__4_4ring9(), step=step, col=col, unit=unit, alt=alt, line=line, solid=solid);
ldraw_lib__4_4ring9(line=0.2);
// file: ../p/1-16chrd.scad
use <../lib.scad>
use <empty.scad>
function ldraw_lib__1_16chrd() = [
// 0 Chord 0.0625
// 0 Name: 1-16chrd.dat
// 0 Author: Philippe Hurbain [Philo]
// 0 !LDRAW_ORG Primitive UPDATE 2015-01
// 0 !LICENSE Licensed under CC BY 4.0 : see CAreadme.txt
// 
// 0 BFC CERTIFY CCW
  [0,"BFC","CERTIFY"],
  [0,"BFC","CCW"],
// 
// 0 !HISTORY 2015-10-11 [PTadmin] Official Update 2015-01
// 
// 
// 0 // This file is intentionally empty because at the current \P resolution,
// 0 // an 1-16chrd is actually empty. However, this file still is present
// 0 // to allow tools to do primitives substition and fill in a real chrd here,
// 0 // or, if desired, to substitute this with the hi-res 48\1-16chrd.
// 
// 0 // This file is based on an idea by Darats at http://forums.ldraw.org/read.php?19,14500,14500#msg-14500
// 
// 1 16 0 0 0 1 0 0 0 1 0 0 0 1 empty.dat
  [1,16,0,0,0,1,0,0,0,1,0,0,0,1, ldraw_lib__empty()],
];
module ldraw_lib__1_16chrd(step=0, col=false, unit=2/5, alt=false, line=0.2, solid=!$preview)
    makepoly(ldraw_lib__1_16chrd(), step=step, col=col, unit=unit, alt=alt, line=line, solid=solid);
ldraw_lib__1_16chrd(line=0.2);
// file: s/98138s01.scad
use <../../lib.scad>
use <../../p/4-4ring9.scad>
use <98138s02.scad>
function ldraw_lib__s__98138s01() = [
// 0 ~Tile  1 x  1 Round with Groove with Partial Top Face
// 0 Name: s\98138s01.dat
// 0 Author: Magnus Forsberg [MagFors]
// 0 !LDRAW_ORG Subpart UPDATE 2020-01
// 0 !LICENSE Licensed under CC BY 4.0 : see CAreadme.txt
// 
// 0 BFC CERTIFY CCW
  [0,"BFC","CERTIFY"],
  [0,"BFC","CCW"],
// 
// 0 !HISTORY 2011-12-29 [PTadmin] Official Update 2011-02
// 0 !HISTORY 2016-06-17 [MagFors] Reduced the rounded edge to 0.5 ldu
// 0 !HISTORY 2016-12-31 [PTadmin] Official Update 2016-01
// 0 !HISTORY 2019-06-17 [MagFors] Removed the rounded edge
// 0 !HISTORY 2019-07-19 [MagFors] Subfiled without top surface
// 0 !HISTORY 2020-06-28 [PTadmin] Official Update 2020-01
// 
// 
// 1 16 0 0 0 1 0 0 0 1 0 0 0 1 s\98138s02.dat
  [1,16,0,0,0,1,0,0,0,1,0,0,0,1, ldraw_lib__s__98138s02()],
// 1 16 0 0 0 1 0 0 0 1 0 0 0 1 4-4ring9.dat
  [1,16,0,0,0,1,0,0,0,1,0,0,0,1, ldraw_lib__4_4ring9()],
];
module ldraw_lib__s__98138s01(step=0, col=false, unit=2/5, alt=false, line=0.2, solid=!$preview)
    makepoly(ldraw_lib__s__98138s01(), step=step, col=col, unit=unit, alt=alt, line=line, solid=solid);
ldraw_lib__s__98138s01(line=0.2);
// file: ../p/4-4ering.scad
use <../lib.scad>
use <1-16chrd.scad>
function ldraw_lib__4_4ering() = [
// 0 Adapter Ring Triangles to Normal 1.0
// 0 Name: 4-4ering.dat
// 0 Author: Philippe Hurbain [Philo]
// 0 !LDRAW_ORG Primitive UPDATE 2015-01
// 0 !LICENSE Licensed under CC BY 4.0 : see CAreadme.txt
// 
// 0 BFC CERTIFY CCW
  [0,"BFC","CERTIFY"],
  [0,"BFC","CCW"],
// 
// 0 !HISTORY 2015-10-11 [PTadmin] Official Update 2015-01
// 
// 
// 0 // This file uses 1-16chrd (actually empty). It allows
// 0 // tools to do primitives substition and fill in a ring of chrd here,
// 0 // or, if desired, to substitute this with the hi-res 48\1-16chrd.
// 0 // This file is based on an idea by Darats at http://forums.ldraw.org/read.php?19,14500,14500#msg-14500
// 
// 1 16 0 0 0 1 0 0 0 1 0 0 0 1 1-16chrd.dat
  [1,16,0,0,0,1,0,0,0,1,0,0,0,1, ldraw_lib__1_16chrd()],
// 1 16 0 0 0 0.92388 0 0.38268 0 1 0 -0.38268 0 0.92388 1-16chrd.dat
  [1,16,0,0,0,0.92388,0,0.38268,0,1,0,-0.38268,0,0.92388, ldraw_lib__1_16chrd()],
// 1 16 0 0 0 0.70711 0 0.70711 0 1 0 -0.70711 0 0.70711 1-16chrd.dat
  [1,16,0,0,0,0.70711,0,0.70711,0,1,0,-0.70711,0,0.70711, ldraw_lib__1_16chrd()],
// 1 16 0 0 0 0.38268 0 0.92388 0 1 0 -0.92388 0 0.38268 1-16chrd.dat
  [1,16,0,0,0,0.38268,0,0.92388,0,1,0,-0.92388,0,0.38268, ldraw_lib__1_16chrd()],
// 1 16 0 0 0 0 0 1 0 1 0 -1 0 0 1-16chrd.dat
  [1,16,0,0,0,0,0,1,0,1,0,-1,0,0, ldraw_lib__1_16chrd()],
// 1 16 0 0 0 -0.38268 0 0.92388 0 1 0 -0.92388 0 -0.38268 1-16chrd.dat
  [1,16,0,0,0,-0.38268,0,0.92388,0,1,0,-0.92388,0,-0.38268, ldraw_lib__1_16chrd()],
// 1 16 0 0 0 -0.70711 0 0.70711 0 1 0 -0.70711 0 -0.70711 1-16chrd.dat
  [1,16,0,0,0,-0.70711,0,0.70711,0,1,0,-0.70711,0,-0.70711, ldraw_lib__1_16chrd()],
// 1 16 0 0 0 -0.92388 0 0.38268 0 1 0 -0.38268 0 -0.92388 1-16chrd.dat
  [1,16,0,0,0,-0.92388,0,0.38268,0,1,0,-0.38268,0,-0.92388, ldraw_lib__1_16chrd()],
// 1 16 0 0 0 0 0 -1 0 1 0 1 0 0 1-16chrd.dat
  [1,16,0,0,0,0,0,-1,0,1,0,1,0,0, ldraw_lib__1_16chrd()],
// 1 16 0 0 0 0.38268 0 -0.92388 0 1 0 0.92388 0 0.38268 1-16chrd.dat
  [1,16,0,0,0,0.38268,0,-0.92388,0,1,0,0.92388,0,0.38268, ldraw_lib__1_16chrd()],
// 1 16 0 0 0 0.70711 0 -0.70711 0 1 0 0.70711 0 0.70711 1-16chrd.dat
  [1,16,0,0,0,0.70711,0,-0.70711,0,1,0,0.70711,0,0.70711, ldraw_lib__1_16chrd()],
// 1 16 0 0 0 0.92388 0 -0.38268 0 1 0 0.38268 0 0.92388 1-16chrd.dat
  [1,16,0,0,0,0.92388,0,-0.38268,0,1,0,0.38268,0,0.92388, ldraw_lib__1_16chrd()],
// 1 16 0 0 0 -1 0 0 0 1 0 0 0 -1 1-16chrd.dat
  [1,16,0,0,0,-1,0,0,0,1,0,0,0,-1, ldraw_lib__1_16chrd()],
// 1 16 0 0 0 -0.92388 0 -0.38268 0 1 0 0.38268 0 -0.92388 1-16chrd.dat
  [1,16,0,0,0,-0.92388,0,-0.38268,0,1,0,0.38268,0,-0.92388, ldraw_lib__1_16chrd()],
// 1 16 0 0 0 -0.70711 0 -0.70711 0 1 0 0.70711 0 -0.70711 1-16chrd.dat
  [1,16,0,0,0,-0.70711,0,-0.70711,0,1,0,0.70711,0,-0.70711, ldraw_lib__1_16chrd()],
// 1 16 0 0 0 -0.38268 0 -0.92388 0 1 0 0.92388 0 -0.38268 1-16chrd.dat
  [1,16,0,0,0,-0.38268,0,-0.92388,0,1,0,0.92388,0,-0.38268, ldraw_lib__1_16chrd()],
];
module ldraw_lib__4_4ering(step=0, col=false, unit=2/5, alt=false, line=0.2, solid=!$preview)
    makepoly(ldraw_lib__4_4ering(), step=step, col=col, unit=unit, alt=alt, line=line, solid=solid);
ldraw_lib__4_4ering(line=0.2);
// main file
use <../lib.scad>
use <../p/4-4ering.scad>
use <s/98138s01.scad>
function ldraw_lib__98138px6() = [
// 0 Tile  1 x  1 Round with White Eye Offset Pattern
// 0 Name: 98138px6.dat
// 0 Author: Gerald Lasser [GeraldLasser]
// 0 !LDRAW_ORG Part UPDATE 2017-01
// 0 !LICENSE Licensed under CC BY 4.0 : see CAreadme.txt
// 
// 0 BFC CERTIFY CCW
  [0,"BFC","CERTIFY"],
  [0,"BFC","CCW"],
// 
// 0 !KEYWORDS Adventure Times, BrickLink 98138pb074
// 
// 0 !HISTORY 2017-12-30 [PTadmin] Official Update 2017-01
// 
// 
// 1 16 0 0 0 1 0 0 0 1 0 0 0 1 s\98138s01.dat
  [1,16,0,0,0,1,0,0,0,1,0,0,0,1, ldraw_lib__s__98138s01()],
// 1 16 0 0 0 9 0 0 0 1 0 0 0 9 4-4ering.dat
  [1,16,0,0,0,9,0,0,0,1,0,0,0,9, ldraw_lib__4_4ering()],
// 4 16 -7.1109 0 -4.7178 -8.3151 0 -3.4443 -6.3639 0 -6.3639 -5.8319 0 -6.6319
  [4,16,-7.1109,0,-4.7178,-8.3151,0,-3.4443,-6.3639,0,-6.3639,-5.8319,0,-6.6319],
// 4 16 -9 0 0 -8.3151 0 -3.4443 -7.1109 0 -4.7178 -7.56 0 -2.46
  [4,16,-9,0,0,-8.3151,0,-3.4443,-7.1109,0,-4.7178,-7.56,0,-2.46],
// 4 16 -8.3151 0 3.4443 -9 0 0 -7.56 0 -2.46 -7.1109 0 -0.2022
  [4,16,-8.3151,0,3.4443,-9,0,0,-7.56,0,-2.46,-7.1109,0,-0.2022],
// 4 16 -8.3151 0 3.4443 -7.1109 0 -0.2022 -5.8319 0 1.7119 -6.3639 0 6.3639
  [4,16,-8.3151,0,3.4443,-7.1109,0,-0.2022,-5.8319,0,1.7119,-6.3639,0,6.3639],
// 4 16 -6.3639 0 6.3639 -5.8319 0 1.7119 -3.9178 0 2.9909 -3.4443 0 8.3151
  [4,16,-6.3639,0,6.3639,-5.8319,0,1.7119,-3.9178,0,2.9909,-3.4443,0,8.3151],
// 4 16 -3.4443 0 8.3151 -3.9178 0 2.9909 -1.66 0 3.44 0 0 9
  [4,16,-3.4443,0,8.3151,-3.9178,0,2.9909,-1.66,0,3.44,0,0,9],
// 4 16 0 0 9 -1.66 0 3.44 0.5978 0 2.9909 3.4443 0 8.3151
  [4,16,0,0,9,-1.66,0,3.44,0.5978,0,2.9909,3.4443,0,8.3151],
// 4 16 3.4443 0 8.3151 0.5978 0 2.9909 2.5119 0 1.7119 6.3639 0 6.3639
  [4,16,3.4443,0,8.3151,0.5978,0,2.9909,2.5119,0,1.7119,6.3639,0,6.3639],
// 4 16 2.5119 0 1.7119 3.7909 0 -0.2022 8.3151 0 3.4443 6.3639 0 6.3639
  [4,16,2.5119,0,1.7119,3.7909,0,-0.2022,8.3151,0,3.4443,6.3639,0,6.3639],
// 4 16 3.7909 0 -0.2022 4.24 0 -2.46 9 0 0 8.3151 0 3.4443
  [4,16,3.7909,0,-0.2022,4.24,0,-2.46,9,0,0,8.3151,0,3.4443],
// 4 16 4.24 0 -2.46 3.7909 0 -4.7178 8.3151 0 -3.4443 9 0 0
  [4,16,4.24,0,-2.46,3.7909,0,-4.7178,8.3151,0,-3.4443,9,0,0],
// 4 16 3.7909 0 -4.7178 2.5119 0 -6.6319 6.3639 0 -6.3639 8.3151 0 -3.4443
  [4,16,3.7909,0,-4.7178,2.5119,0,-6.6319,6.3639,0,-6.3639,8.3151,0,-3.4443],
// 4 16 2.5119 0 -6.6319 0.5978 0 -7.9109 3.4443 0 -8.3151 6.3639 0 -6.3639
  [4,16,2.5119,0,-6.6319,0.5978,0,-7.9109,3.4443,0,-8.3151,6.3639,0,-6.3639],
// 4 16 -1.66 0 -8.36 0 0 -9 3.4443 0 -8.3151 0.5978 0 -7.9109
  [4,16,-1.66,0,-8.36,0,0,-9,3.4443,0,-8.3151,0.5978,0,-7.9109],
// 4 16 -3.4443 0 -8.3151 0 0 -9 -1.66 0 -8.36 -3.9178 0 -7.9109
  [4,16,-3.4443,0,-8.3151,0,0,-9,-1.66,0,-8.36,-3.9178,0,-7.9109],
// 4 15 -1.66 0 -2.46 -7.1109 0 -0.2022 -7.56 0 -2.46 -7.1109 0 -4.7178
  [4,15,-1.66,0,-2.46,-7.1109,0,-0.2022,-7.56,0,-2.46,-7.1109,0,-4.7178],
// 4 15 -1.66 0 -2.46 -7.1109 0 -4.7178 -5.8319 0 -6.6319 -3.9178 0 -7.9109
  [4,15,-1.66,0,-2.46,-7.1109,0,-4.7178,-5.8319,0,-6.6319,-3.9178,0,-7.9109],
// 4 15 -1.66 0 -2.46 -3.9178 0 -7.9109 -1.66 0 -8.36 0.5978 0 -7.9109
  [4,15,-1.66,0,-2.46,-3.9178,0,-7.9109,-1.66,0,-8.36,0.5978,0,-7.9109],
// 4 15 -1.66 0 -2.46 0.5978 0 -7.9109 2.5119 0 -6.6319 3.7909 0 -4.7178
  [4,15,-1.66,0,-2.46,0.5978,0,-7.9109,2.5119,0,-6.6319,3.7909,0,-4.7178],
// 4 15 -1.66 0 -2.46 3.7909 0 -4.7178 4.24 0 -2.46 3.7909 0 -0.2022
  [4,15,-1.66,0,-2.46,3.7909,0,-4.7178,4.24,0,-2.46,3.7909,0,-0.2022],
// 4 15 -1.66 0 -2.46 3.7909 0 -0.2022 2.5119 0 1.7119 0.5978 0 2.9909
  [4,15,-1.66,0,-2.46,3.7909,0,-0.2022,2.5119,0,1.7119,0.5978,0,2.9909],
// 4 15 -1.66 0 -2.46 0.5978 0 2.9909 -1.66 0 3.44 -3.9178 0 2.9909
  [4,15,-1.66,0,-2.46,0.5978,0,2.9909,-1.66,0,3.44,-3.9178,0,2.9909],
// 4 15 -1.66 0 -2.46 -3.9178 0 2.9909 -5.8319 0 1.7119 -7.1109 0 -0.2022
  [4,15,-1.66,0,-2.46,-3.9178,0,2.9909,-5.8319,0,1.7119,-7.1109,0,-0.2022],
// 4 16 -5.8319 0 -6.6319 -6.3639 0 -6.3639 -3.4443 0 -8.3151 -3.9178 0 -7.9109
  [4,16,-5.8319,0,-6.6319,-6.3639,0,-6.3639,-3.4443,0,-8.3151,-3.9178,0,-7.9109],
];
module ldraw_lib__98138px6(step=0, col=false, unit=2/5, alt=false, line=0.2, solid=!$preview)
    makepoly(ldraw_lib__98138px6(), step=step, col=col, unit=unit, alt=alt, line=line, solid=solid);
ldraw_lib__98138px6(line=0.2);
